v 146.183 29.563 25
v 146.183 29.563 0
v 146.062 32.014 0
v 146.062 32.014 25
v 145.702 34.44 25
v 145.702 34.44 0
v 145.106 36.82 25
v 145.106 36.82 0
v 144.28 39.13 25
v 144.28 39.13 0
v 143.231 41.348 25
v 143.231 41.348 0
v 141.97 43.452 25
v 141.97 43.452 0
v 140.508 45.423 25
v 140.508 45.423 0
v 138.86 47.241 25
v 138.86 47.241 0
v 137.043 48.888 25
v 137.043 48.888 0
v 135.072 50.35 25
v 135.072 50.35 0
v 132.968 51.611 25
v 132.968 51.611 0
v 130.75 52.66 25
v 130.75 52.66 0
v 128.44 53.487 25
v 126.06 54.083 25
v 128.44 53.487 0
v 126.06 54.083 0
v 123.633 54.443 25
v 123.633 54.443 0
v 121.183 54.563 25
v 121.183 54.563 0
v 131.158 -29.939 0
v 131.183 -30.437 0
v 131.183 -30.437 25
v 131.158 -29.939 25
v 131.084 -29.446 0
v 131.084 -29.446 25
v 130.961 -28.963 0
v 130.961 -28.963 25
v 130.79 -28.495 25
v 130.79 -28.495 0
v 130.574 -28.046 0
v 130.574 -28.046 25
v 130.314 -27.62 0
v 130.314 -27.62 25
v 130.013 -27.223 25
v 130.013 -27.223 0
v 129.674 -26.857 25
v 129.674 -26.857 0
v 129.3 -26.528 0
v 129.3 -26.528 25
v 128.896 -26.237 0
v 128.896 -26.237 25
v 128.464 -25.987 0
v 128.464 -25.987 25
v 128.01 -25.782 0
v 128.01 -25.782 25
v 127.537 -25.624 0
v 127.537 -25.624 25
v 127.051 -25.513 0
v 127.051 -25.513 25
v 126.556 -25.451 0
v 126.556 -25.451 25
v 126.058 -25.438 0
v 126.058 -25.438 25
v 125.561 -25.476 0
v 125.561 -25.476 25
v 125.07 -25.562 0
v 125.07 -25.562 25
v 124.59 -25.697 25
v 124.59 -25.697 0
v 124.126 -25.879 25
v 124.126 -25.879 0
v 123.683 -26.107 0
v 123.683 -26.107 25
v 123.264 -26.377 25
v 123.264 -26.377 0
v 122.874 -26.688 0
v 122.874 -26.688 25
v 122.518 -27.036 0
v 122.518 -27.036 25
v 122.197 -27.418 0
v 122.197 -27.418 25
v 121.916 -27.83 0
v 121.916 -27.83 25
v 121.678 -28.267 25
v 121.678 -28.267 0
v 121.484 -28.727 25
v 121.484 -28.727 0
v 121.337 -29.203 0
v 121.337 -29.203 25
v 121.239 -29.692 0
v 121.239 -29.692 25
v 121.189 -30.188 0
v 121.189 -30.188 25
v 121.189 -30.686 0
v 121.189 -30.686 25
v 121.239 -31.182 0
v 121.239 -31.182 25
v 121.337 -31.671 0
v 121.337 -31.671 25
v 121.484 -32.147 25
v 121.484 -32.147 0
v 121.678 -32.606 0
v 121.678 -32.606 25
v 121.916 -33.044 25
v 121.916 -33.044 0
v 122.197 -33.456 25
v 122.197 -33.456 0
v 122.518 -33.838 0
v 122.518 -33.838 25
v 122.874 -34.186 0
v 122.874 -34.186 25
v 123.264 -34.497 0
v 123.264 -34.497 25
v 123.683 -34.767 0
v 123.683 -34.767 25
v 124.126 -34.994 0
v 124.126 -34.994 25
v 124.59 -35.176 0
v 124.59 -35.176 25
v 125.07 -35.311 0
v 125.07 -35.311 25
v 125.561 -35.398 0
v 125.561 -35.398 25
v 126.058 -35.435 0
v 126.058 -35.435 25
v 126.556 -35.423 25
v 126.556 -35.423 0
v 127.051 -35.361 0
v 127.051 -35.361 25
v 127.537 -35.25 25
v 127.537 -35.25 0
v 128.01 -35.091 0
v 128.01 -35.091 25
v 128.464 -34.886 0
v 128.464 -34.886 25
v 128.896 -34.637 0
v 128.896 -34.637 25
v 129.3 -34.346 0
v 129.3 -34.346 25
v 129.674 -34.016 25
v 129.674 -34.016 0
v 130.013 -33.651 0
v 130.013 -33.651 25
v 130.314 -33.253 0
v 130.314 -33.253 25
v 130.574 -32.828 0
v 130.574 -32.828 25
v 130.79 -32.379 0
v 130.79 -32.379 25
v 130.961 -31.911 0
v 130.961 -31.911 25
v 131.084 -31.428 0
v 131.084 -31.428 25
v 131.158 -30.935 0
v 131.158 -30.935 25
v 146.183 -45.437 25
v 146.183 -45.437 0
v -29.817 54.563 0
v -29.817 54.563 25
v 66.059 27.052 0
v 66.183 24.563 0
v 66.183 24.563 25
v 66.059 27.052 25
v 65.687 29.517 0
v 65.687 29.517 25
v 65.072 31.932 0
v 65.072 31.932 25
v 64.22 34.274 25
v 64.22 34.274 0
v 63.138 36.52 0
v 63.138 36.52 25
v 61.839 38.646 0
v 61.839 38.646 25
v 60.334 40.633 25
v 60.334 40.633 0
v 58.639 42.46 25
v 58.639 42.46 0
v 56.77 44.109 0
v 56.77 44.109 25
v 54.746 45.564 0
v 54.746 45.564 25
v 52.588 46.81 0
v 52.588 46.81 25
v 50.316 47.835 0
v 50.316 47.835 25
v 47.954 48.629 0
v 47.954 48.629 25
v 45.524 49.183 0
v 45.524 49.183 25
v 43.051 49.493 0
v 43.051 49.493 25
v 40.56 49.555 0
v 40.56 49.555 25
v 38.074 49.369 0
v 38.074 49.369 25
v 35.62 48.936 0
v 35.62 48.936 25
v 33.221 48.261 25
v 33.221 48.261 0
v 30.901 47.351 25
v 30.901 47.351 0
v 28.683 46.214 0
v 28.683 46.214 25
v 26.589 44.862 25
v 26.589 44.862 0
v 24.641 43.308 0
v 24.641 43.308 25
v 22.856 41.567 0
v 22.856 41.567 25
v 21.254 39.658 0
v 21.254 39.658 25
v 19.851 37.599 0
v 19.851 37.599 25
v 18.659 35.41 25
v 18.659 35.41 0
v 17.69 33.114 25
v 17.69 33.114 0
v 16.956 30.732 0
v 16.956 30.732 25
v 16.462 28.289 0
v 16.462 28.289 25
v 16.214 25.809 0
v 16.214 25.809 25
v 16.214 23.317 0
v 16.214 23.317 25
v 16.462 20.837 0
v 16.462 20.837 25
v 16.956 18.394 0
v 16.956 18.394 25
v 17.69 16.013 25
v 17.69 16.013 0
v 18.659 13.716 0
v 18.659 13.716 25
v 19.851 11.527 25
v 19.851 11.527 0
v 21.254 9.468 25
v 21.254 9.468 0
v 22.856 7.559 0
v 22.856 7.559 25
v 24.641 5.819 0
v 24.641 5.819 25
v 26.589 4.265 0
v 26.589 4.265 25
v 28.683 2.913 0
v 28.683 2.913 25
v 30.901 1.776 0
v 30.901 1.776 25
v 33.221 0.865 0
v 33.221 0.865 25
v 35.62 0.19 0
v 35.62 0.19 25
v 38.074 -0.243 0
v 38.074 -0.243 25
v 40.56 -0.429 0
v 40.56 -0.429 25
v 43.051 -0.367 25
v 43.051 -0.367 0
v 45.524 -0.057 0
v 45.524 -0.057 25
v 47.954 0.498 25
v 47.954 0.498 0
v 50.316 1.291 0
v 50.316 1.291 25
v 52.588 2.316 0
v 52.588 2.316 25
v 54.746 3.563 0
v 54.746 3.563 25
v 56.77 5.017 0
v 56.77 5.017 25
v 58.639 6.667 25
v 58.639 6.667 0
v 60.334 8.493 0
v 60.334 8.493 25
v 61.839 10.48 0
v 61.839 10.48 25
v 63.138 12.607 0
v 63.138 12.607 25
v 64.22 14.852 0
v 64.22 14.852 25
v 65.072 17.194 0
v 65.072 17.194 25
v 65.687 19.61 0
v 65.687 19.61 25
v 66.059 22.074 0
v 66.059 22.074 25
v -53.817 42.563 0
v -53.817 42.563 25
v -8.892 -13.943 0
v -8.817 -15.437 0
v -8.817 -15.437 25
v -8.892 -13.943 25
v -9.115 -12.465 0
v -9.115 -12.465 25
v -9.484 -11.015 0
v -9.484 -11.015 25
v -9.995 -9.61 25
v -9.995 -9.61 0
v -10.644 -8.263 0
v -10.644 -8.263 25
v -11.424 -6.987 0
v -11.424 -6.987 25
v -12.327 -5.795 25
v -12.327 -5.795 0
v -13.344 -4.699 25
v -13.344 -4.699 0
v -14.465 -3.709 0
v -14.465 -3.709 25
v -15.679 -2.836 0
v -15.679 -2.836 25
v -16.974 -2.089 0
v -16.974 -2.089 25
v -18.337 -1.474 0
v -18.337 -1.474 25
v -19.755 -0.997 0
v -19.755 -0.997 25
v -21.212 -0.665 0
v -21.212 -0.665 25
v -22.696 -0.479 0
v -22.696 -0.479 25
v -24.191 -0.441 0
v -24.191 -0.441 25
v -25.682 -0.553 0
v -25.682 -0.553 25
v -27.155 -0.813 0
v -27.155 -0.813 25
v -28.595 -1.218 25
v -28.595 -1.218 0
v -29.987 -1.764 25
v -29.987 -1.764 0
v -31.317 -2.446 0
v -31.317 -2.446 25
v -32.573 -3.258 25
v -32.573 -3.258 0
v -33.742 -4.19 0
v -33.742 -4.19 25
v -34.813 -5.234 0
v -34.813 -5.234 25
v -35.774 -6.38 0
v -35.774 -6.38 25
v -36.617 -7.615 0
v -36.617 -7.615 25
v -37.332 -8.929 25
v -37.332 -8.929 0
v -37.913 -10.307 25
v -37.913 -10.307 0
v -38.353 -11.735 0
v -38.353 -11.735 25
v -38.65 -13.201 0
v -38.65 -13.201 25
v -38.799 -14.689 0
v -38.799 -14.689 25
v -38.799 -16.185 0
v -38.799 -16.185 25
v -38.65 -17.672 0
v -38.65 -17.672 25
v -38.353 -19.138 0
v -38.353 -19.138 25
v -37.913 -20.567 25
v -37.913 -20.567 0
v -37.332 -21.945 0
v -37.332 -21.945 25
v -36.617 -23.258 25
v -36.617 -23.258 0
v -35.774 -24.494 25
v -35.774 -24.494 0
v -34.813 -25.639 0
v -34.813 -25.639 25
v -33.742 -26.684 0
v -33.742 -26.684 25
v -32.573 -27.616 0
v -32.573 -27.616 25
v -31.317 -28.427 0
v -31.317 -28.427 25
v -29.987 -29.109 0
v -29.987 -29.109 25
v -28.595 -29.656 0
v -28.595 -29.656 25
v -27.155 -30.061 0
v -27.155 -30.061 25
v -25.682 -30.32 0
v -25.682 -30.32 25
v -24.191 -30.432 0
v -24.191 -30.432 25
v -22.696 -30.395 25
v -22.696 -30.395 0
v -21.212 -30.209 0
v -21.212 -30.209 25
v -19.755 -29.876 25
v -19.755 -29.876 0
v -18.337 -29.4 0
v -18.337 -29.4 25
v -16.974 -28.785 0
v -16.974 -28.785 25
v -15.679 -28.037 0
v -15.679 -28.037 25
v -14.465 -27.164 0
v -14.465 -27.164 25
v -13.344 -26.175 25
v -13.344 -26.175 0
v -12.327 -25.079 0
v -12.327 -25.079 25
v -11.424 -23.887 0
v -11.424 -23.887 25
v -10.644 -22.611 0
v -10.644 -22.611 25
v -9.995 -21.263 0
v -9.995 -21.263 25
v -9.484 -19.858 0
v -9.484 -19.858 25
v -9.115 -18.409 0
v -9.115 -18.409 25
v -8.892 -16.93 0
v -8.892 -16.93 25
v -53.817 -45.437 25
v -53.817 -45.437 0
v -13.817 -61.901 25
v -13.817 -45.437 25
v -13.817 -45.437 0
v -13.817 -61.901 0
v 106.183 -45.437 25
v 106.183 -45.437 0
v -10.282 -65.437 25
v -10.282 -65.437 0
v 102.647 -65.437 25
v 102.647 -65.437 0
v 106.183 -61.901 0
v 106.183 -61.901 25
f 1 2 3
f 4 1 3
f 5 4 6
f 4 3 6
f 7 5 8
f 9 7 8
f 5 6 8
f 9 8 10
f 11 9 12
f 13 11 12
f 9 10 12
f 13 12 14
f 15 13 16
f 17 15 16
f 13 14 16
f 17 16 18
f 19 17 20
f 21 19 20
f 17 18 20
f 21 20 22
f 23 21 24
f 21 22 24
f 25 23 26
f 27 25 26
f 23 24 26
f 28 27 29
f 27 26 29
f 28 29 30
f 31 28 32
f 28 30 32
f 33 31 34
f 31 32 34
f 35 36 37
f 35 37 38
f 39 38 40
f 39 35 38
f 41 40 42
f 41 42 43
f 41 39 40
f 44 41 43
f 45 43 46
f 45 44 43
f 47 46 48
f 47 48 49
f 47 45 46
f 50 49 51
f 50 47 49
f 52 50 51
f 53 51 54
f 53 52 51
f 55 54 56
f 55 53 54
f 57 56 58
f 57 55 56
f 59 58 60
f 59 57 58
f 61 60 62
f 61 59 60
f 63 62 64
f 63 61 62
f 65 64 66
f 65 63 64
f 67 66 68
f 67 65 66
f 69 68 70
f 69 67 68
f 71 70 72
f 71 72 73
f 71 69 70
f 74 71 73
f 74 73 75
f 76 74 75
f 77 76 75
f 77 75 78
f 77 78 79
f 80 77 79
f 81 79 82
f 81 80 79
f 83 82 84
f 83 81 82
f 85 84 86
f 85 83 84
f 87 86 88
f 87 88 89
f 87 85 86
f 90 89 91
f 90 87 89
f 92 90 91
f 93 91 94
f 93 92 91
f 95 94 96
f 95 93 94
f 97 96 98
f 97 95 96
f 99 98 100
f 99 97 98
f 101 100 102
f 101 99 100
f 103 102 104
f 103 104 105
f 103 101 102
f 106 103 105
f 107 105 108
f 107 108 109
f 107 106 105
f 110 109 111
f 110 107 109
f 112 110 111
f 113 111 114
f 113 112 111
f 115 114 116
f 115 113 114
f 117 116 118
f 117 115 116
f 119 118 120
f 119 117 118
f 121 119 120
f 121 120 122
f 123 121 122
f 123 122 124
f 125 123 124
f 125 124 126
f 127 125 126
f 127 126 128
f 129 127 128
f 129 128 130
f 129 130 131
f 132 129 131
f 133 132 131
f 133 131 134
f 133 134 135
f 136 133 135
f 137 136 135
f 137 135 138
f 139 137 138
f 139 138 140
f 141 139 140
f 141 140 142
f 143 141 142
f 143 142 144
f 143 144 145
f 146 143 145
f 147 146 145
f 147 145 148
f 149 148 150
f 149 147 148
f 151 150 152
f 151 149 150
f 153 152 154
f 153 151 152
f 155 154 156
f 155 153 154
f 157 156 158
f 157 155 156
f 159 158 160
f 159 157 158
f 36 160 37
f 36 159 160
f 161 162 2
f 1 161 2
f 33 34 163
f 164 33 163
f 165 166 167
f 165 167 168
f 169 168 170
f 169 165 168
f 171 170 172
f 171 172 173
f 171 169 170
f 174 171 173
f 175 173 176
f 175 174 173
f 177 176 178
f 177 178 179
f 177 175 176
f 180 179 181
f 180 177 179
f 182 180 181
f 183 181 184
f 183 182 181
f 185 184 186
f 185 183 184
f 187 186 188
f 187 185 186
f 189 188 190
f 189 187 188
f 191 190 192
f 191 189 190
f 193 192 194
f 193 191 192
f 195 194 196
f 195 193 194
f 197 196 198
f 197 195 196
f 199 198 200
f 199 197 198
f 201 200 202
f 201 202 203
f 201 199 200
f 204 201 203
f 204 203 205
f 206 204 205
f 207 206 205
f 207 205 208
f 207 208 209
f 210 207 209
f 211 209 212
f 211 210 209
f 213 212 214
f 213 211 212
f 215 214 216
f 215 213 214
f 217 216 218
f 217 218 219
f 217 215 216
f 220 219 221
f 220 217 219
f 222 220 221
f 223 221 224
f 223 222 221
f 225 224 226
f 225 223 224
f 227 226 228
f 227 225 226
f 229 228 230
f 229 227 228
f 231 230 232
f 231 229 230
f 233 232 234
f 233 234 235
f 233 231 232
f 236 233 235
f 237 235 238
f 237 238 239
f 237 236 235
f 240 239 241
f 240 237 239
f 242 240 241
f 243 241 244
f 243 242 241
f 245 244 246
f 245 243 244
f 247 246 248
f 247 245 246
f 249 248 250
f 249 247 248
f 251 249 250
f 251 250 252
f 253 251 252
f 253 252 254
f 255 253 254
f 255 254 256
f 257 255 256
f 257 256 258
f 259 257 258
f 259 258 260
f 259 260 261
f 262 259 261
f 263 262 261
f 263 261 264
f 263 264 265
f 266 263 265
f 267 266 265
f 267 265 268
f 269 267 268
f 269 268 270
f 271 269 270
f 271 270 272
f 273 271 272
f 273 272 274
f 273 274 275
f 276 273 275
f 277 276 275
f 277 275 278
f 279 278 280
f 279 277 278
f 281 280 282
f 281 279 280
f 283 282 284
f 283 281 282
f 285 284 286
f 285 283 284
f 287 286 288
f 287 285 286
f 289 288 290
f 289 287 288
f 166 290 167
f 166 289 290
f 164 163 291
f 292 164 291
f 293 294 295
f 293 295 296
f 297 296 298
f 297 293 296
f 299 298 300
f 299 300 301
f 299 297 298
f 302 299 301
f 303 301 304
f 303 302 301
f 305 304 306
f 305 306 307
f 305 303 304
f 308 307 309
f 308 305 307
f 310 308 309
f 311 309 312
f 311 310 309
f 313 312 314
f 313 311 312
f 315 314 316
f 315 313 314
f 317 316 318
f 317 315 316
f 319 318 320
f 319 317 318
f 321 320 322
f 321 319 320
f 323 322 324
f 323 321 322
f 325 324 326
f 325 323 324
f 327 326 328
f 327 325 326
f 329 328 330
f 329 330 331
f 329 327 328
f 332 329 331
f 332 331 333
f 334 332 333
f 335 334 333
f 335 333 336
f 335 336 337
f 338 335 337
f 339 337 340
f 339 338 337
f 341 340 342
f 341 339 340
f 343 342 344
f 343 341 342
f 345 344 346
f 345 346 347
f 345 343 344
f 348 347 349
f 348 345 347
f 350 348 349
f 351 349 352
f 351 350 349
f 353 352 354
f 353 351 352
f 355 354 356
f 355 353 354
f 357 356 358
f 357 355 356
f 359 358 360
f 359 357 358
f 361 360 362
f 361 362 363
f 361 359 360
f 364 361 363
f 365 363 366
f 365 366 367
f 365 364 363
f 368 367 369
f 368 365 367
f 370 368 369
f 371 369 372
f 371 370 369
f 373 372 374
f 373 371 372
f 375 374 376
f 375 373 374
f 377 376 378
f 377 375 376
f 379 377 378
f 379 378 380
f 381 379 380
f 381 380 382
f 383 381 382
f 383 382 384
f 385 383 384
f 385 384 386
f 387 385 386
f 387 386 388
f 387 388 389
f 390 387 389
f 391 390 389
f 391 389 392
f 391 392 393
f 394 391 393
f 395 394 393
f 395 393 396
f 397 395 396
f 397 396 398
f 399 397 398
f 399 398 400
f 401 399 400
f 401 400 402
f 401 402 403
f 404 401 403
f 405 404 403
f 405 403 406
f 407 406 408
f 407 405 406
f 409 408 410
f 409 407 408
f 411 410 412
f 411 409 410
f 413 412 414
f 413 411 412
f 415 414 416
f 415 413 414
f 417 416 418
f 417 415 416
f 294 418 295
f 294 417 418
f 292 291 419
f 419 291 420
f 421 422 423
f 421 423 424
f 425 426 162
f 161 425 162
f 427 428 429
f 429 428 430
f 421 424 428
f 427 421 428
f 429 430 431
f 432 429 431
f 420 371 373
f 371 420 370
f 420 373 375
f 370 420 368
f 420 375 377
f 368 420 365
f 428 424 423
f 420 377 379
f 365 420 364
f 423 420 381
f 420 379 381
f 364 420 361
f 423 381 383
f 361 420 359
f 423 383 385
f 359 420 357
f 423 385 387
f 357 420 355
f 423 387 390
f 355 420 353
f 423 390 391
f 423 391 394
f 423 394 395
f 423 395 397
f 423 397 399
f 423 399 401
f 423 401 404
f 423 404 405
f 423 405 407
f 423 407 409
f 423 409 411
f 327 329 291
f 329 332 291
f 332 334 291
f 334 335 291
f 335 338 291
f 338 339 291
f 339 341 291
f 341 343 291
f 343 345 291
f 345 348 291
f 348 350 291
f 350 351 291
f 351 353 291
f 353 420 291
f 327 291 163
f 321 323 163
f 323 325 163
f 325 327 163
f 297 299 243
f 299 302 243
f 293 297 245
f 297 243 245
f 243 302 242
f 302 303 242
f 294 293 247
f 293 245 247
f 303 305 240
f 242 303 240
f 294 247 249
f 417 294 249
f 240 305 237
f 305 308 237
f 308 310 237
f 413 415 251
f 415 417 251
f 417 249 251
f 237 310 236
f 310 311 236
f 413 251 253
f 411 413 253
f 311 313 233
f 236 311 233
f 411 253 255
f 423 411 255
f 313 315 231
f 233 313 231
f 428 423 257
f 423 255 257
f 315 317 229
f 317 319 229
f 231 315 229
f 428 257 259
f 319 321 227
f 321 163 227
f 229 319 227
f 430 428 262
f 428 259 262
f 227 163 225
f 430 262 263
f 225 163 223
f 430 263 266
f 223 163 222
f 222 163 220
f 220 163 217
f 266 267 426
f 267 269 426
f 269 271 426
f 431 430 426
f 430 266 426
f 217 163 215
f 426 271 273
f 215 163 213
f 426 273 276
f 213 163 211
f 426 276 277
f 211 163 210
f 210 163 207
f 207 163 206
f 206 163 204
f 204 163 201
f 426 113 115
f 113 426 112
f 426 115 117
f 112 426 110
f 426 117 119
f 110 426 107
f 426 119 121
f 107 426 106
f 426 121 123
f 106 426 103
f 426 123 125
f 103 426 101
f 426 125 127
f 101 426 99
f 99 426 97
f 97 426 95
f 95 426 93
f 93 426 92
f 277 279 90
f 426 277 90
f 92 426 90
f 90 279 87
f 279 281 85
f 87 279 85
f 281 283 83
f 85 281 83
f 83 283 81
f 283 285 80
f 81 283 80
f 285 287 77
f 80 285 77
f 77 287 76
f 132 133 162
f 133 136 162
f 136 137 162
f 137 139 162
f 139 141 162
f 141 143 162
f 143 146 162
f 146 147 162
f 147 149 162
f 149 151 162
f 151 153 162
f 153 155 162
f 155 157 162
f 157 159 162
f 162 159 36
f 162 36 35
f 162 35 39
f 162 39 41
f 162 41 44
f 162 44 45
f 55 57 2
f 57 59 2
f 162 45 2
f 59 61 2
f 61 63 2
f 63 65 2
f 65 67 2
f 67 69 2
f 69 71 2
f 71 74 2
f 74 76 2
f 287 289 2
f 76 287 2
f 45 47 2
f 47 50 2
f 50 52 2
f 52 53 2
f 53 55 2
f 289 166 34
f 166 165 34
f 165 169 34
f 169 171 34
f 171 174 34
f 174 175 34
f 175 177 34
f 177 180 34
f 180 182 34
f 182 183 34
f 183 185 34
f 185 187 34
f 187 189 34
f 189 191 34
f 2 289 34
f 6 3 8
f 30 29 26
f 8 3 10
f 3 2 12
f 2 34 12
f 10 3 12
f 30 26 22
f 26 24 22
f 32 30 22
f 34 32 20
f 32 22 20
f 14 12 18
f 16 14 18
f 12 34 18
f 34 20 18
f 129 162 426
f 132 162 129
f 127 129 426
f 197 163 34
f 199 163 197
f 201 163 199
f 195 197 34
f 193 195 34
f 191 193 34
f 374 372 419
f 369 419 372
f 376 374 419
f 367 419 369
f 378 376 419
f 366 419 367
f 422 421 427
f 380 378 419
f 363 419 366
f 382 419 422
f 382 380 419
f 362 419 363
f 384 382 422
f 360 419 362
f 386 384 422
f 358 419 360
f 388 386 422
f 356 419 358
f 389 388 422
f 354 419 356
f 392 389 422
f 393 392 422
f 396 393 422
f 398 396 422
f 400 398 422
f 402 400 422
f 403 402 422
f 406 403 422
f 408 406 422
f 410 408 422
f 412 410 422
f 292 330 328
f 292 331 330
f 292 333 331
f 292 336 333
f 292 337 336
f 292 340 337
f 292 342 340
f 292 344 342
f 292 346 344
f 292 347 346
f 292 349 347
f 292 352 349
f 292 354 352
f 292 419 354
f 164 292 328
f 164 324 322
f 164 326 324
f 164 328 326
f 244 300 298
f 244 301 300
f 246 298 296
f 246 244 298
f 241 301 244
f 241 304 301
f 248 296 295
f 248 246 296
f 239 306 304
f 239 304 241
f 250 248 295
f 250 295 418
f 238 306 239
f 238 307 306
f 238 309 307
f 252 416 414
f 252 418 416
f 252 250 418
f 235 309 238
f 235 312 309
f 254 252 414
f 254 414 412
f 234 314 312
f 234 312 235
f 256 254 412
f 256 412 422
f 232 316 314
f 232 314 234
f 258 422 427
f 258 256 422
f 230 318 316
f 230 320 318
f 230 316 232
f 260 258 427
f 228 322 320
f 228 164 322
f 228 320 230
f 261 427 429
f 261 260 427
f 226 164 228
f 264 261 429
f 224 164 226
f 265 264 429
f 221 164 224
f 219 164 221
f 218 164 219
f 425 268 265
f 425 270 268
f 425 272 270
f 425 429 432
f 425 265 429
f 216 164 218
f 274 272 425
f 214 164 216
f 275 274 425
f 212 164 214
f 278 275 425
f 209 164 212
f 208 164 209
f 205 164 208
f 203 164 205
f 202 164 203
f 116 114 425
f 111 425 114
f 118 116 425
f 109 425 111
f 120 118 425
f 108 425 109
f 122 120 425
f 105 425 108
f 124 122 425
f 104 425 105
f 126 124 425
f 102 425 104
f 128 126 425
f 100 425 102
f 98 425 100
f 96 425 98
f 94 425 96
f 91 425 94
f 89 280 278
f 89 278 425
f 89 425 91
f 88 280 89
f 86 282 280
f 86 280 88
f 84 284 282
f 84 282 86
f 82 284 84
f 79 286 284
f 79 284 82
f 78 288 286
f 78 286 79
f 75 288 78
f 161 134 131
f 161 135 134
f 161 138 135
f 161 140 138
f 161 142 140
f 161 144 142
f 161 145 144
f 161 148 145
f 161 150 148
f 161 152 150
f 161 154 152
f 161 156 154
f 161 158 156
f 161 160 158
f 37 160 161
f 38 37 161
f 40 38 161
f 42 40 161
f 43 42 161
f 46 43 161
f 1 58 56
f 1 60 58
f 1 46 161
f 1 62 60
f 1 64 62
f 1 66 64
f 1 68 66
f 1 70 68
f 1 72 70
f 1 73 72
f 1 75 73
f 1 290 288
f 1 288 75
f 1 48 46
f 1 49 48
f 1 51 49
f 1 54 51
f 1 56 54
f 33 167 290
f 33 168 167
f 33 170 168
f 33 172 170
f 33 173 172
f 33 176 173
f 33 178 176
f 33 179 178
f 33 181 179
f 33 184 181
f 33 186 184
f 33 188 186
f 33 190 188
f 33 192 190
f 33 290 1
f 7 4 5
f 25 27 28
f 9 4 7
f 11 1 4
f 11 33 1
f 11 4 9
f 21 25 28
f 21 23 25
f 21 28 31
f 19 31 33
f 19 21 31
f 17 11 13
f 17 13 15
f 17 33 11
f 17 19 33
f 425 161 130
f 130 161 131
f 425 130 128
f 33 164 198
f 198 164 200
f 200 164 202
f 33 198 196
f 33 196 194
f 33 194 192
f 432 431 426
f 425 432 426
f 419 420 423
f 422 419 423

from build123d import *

# Parameters (mm, degrees)
F0_R     = 15
F0_R_2   = 5
F0_R_3   = 25
F1_DEPTH = 25


with BuildPart() as f1:
    # F0 (on Top) → F1 (new body)
    with BuildSketch(Plane.XY):
        with BuildLine():
            Line((-29.817205, 54.56318), (-53.817205, 42.56318))
            Line((-53.817205, 42.56318), (-53.817205, -45.43682))
            Line((-53.817205, -45.43682), (-13.817205, -45.43682))
            Line((-13.817205, -45.43682), (-13.817205, -61.901286))
            Line((-13.817205, -61.901286), (-10.281671, -65.43682))
            Line((-10.281671, -65.43682), (102.647265, -65.43682))
            Line((102.647265, -65.43682), (106.182795, -61.90129))
            Line((106.182795, -61.90129), (106.182795, -45.43682))
            Line((106.182795, -45.43682), (146.182795, -45.43682))
            Line((146.182795, -45.43682), (146.182795, 29.56318))
            ThreePointArc((146.182795, 29.56318), (138.860464, 47.240849), (121.182795, 54.56318))
            Line((121.182795, 54.56318), (41.182795, 54.56318))
            Line((41.182795, 54.56318), (-29.817205, 54.56318))
        make_face()
        with Locations((-23.817205, -15.43682)):
            Circle(F0_R, mode=Mode.SUBTRACT)
        with Locations((126.182795, -30.43682)):
            Circle(F0_R_2, mode=Mode.SUBTRACT)
        with Locations((41.182795, 24.56318)):
            Circle(F0_R_3, mode=Mode.SUBTRACT)
    extrude(amount=F1_DEPTH)


solid = f1.part
